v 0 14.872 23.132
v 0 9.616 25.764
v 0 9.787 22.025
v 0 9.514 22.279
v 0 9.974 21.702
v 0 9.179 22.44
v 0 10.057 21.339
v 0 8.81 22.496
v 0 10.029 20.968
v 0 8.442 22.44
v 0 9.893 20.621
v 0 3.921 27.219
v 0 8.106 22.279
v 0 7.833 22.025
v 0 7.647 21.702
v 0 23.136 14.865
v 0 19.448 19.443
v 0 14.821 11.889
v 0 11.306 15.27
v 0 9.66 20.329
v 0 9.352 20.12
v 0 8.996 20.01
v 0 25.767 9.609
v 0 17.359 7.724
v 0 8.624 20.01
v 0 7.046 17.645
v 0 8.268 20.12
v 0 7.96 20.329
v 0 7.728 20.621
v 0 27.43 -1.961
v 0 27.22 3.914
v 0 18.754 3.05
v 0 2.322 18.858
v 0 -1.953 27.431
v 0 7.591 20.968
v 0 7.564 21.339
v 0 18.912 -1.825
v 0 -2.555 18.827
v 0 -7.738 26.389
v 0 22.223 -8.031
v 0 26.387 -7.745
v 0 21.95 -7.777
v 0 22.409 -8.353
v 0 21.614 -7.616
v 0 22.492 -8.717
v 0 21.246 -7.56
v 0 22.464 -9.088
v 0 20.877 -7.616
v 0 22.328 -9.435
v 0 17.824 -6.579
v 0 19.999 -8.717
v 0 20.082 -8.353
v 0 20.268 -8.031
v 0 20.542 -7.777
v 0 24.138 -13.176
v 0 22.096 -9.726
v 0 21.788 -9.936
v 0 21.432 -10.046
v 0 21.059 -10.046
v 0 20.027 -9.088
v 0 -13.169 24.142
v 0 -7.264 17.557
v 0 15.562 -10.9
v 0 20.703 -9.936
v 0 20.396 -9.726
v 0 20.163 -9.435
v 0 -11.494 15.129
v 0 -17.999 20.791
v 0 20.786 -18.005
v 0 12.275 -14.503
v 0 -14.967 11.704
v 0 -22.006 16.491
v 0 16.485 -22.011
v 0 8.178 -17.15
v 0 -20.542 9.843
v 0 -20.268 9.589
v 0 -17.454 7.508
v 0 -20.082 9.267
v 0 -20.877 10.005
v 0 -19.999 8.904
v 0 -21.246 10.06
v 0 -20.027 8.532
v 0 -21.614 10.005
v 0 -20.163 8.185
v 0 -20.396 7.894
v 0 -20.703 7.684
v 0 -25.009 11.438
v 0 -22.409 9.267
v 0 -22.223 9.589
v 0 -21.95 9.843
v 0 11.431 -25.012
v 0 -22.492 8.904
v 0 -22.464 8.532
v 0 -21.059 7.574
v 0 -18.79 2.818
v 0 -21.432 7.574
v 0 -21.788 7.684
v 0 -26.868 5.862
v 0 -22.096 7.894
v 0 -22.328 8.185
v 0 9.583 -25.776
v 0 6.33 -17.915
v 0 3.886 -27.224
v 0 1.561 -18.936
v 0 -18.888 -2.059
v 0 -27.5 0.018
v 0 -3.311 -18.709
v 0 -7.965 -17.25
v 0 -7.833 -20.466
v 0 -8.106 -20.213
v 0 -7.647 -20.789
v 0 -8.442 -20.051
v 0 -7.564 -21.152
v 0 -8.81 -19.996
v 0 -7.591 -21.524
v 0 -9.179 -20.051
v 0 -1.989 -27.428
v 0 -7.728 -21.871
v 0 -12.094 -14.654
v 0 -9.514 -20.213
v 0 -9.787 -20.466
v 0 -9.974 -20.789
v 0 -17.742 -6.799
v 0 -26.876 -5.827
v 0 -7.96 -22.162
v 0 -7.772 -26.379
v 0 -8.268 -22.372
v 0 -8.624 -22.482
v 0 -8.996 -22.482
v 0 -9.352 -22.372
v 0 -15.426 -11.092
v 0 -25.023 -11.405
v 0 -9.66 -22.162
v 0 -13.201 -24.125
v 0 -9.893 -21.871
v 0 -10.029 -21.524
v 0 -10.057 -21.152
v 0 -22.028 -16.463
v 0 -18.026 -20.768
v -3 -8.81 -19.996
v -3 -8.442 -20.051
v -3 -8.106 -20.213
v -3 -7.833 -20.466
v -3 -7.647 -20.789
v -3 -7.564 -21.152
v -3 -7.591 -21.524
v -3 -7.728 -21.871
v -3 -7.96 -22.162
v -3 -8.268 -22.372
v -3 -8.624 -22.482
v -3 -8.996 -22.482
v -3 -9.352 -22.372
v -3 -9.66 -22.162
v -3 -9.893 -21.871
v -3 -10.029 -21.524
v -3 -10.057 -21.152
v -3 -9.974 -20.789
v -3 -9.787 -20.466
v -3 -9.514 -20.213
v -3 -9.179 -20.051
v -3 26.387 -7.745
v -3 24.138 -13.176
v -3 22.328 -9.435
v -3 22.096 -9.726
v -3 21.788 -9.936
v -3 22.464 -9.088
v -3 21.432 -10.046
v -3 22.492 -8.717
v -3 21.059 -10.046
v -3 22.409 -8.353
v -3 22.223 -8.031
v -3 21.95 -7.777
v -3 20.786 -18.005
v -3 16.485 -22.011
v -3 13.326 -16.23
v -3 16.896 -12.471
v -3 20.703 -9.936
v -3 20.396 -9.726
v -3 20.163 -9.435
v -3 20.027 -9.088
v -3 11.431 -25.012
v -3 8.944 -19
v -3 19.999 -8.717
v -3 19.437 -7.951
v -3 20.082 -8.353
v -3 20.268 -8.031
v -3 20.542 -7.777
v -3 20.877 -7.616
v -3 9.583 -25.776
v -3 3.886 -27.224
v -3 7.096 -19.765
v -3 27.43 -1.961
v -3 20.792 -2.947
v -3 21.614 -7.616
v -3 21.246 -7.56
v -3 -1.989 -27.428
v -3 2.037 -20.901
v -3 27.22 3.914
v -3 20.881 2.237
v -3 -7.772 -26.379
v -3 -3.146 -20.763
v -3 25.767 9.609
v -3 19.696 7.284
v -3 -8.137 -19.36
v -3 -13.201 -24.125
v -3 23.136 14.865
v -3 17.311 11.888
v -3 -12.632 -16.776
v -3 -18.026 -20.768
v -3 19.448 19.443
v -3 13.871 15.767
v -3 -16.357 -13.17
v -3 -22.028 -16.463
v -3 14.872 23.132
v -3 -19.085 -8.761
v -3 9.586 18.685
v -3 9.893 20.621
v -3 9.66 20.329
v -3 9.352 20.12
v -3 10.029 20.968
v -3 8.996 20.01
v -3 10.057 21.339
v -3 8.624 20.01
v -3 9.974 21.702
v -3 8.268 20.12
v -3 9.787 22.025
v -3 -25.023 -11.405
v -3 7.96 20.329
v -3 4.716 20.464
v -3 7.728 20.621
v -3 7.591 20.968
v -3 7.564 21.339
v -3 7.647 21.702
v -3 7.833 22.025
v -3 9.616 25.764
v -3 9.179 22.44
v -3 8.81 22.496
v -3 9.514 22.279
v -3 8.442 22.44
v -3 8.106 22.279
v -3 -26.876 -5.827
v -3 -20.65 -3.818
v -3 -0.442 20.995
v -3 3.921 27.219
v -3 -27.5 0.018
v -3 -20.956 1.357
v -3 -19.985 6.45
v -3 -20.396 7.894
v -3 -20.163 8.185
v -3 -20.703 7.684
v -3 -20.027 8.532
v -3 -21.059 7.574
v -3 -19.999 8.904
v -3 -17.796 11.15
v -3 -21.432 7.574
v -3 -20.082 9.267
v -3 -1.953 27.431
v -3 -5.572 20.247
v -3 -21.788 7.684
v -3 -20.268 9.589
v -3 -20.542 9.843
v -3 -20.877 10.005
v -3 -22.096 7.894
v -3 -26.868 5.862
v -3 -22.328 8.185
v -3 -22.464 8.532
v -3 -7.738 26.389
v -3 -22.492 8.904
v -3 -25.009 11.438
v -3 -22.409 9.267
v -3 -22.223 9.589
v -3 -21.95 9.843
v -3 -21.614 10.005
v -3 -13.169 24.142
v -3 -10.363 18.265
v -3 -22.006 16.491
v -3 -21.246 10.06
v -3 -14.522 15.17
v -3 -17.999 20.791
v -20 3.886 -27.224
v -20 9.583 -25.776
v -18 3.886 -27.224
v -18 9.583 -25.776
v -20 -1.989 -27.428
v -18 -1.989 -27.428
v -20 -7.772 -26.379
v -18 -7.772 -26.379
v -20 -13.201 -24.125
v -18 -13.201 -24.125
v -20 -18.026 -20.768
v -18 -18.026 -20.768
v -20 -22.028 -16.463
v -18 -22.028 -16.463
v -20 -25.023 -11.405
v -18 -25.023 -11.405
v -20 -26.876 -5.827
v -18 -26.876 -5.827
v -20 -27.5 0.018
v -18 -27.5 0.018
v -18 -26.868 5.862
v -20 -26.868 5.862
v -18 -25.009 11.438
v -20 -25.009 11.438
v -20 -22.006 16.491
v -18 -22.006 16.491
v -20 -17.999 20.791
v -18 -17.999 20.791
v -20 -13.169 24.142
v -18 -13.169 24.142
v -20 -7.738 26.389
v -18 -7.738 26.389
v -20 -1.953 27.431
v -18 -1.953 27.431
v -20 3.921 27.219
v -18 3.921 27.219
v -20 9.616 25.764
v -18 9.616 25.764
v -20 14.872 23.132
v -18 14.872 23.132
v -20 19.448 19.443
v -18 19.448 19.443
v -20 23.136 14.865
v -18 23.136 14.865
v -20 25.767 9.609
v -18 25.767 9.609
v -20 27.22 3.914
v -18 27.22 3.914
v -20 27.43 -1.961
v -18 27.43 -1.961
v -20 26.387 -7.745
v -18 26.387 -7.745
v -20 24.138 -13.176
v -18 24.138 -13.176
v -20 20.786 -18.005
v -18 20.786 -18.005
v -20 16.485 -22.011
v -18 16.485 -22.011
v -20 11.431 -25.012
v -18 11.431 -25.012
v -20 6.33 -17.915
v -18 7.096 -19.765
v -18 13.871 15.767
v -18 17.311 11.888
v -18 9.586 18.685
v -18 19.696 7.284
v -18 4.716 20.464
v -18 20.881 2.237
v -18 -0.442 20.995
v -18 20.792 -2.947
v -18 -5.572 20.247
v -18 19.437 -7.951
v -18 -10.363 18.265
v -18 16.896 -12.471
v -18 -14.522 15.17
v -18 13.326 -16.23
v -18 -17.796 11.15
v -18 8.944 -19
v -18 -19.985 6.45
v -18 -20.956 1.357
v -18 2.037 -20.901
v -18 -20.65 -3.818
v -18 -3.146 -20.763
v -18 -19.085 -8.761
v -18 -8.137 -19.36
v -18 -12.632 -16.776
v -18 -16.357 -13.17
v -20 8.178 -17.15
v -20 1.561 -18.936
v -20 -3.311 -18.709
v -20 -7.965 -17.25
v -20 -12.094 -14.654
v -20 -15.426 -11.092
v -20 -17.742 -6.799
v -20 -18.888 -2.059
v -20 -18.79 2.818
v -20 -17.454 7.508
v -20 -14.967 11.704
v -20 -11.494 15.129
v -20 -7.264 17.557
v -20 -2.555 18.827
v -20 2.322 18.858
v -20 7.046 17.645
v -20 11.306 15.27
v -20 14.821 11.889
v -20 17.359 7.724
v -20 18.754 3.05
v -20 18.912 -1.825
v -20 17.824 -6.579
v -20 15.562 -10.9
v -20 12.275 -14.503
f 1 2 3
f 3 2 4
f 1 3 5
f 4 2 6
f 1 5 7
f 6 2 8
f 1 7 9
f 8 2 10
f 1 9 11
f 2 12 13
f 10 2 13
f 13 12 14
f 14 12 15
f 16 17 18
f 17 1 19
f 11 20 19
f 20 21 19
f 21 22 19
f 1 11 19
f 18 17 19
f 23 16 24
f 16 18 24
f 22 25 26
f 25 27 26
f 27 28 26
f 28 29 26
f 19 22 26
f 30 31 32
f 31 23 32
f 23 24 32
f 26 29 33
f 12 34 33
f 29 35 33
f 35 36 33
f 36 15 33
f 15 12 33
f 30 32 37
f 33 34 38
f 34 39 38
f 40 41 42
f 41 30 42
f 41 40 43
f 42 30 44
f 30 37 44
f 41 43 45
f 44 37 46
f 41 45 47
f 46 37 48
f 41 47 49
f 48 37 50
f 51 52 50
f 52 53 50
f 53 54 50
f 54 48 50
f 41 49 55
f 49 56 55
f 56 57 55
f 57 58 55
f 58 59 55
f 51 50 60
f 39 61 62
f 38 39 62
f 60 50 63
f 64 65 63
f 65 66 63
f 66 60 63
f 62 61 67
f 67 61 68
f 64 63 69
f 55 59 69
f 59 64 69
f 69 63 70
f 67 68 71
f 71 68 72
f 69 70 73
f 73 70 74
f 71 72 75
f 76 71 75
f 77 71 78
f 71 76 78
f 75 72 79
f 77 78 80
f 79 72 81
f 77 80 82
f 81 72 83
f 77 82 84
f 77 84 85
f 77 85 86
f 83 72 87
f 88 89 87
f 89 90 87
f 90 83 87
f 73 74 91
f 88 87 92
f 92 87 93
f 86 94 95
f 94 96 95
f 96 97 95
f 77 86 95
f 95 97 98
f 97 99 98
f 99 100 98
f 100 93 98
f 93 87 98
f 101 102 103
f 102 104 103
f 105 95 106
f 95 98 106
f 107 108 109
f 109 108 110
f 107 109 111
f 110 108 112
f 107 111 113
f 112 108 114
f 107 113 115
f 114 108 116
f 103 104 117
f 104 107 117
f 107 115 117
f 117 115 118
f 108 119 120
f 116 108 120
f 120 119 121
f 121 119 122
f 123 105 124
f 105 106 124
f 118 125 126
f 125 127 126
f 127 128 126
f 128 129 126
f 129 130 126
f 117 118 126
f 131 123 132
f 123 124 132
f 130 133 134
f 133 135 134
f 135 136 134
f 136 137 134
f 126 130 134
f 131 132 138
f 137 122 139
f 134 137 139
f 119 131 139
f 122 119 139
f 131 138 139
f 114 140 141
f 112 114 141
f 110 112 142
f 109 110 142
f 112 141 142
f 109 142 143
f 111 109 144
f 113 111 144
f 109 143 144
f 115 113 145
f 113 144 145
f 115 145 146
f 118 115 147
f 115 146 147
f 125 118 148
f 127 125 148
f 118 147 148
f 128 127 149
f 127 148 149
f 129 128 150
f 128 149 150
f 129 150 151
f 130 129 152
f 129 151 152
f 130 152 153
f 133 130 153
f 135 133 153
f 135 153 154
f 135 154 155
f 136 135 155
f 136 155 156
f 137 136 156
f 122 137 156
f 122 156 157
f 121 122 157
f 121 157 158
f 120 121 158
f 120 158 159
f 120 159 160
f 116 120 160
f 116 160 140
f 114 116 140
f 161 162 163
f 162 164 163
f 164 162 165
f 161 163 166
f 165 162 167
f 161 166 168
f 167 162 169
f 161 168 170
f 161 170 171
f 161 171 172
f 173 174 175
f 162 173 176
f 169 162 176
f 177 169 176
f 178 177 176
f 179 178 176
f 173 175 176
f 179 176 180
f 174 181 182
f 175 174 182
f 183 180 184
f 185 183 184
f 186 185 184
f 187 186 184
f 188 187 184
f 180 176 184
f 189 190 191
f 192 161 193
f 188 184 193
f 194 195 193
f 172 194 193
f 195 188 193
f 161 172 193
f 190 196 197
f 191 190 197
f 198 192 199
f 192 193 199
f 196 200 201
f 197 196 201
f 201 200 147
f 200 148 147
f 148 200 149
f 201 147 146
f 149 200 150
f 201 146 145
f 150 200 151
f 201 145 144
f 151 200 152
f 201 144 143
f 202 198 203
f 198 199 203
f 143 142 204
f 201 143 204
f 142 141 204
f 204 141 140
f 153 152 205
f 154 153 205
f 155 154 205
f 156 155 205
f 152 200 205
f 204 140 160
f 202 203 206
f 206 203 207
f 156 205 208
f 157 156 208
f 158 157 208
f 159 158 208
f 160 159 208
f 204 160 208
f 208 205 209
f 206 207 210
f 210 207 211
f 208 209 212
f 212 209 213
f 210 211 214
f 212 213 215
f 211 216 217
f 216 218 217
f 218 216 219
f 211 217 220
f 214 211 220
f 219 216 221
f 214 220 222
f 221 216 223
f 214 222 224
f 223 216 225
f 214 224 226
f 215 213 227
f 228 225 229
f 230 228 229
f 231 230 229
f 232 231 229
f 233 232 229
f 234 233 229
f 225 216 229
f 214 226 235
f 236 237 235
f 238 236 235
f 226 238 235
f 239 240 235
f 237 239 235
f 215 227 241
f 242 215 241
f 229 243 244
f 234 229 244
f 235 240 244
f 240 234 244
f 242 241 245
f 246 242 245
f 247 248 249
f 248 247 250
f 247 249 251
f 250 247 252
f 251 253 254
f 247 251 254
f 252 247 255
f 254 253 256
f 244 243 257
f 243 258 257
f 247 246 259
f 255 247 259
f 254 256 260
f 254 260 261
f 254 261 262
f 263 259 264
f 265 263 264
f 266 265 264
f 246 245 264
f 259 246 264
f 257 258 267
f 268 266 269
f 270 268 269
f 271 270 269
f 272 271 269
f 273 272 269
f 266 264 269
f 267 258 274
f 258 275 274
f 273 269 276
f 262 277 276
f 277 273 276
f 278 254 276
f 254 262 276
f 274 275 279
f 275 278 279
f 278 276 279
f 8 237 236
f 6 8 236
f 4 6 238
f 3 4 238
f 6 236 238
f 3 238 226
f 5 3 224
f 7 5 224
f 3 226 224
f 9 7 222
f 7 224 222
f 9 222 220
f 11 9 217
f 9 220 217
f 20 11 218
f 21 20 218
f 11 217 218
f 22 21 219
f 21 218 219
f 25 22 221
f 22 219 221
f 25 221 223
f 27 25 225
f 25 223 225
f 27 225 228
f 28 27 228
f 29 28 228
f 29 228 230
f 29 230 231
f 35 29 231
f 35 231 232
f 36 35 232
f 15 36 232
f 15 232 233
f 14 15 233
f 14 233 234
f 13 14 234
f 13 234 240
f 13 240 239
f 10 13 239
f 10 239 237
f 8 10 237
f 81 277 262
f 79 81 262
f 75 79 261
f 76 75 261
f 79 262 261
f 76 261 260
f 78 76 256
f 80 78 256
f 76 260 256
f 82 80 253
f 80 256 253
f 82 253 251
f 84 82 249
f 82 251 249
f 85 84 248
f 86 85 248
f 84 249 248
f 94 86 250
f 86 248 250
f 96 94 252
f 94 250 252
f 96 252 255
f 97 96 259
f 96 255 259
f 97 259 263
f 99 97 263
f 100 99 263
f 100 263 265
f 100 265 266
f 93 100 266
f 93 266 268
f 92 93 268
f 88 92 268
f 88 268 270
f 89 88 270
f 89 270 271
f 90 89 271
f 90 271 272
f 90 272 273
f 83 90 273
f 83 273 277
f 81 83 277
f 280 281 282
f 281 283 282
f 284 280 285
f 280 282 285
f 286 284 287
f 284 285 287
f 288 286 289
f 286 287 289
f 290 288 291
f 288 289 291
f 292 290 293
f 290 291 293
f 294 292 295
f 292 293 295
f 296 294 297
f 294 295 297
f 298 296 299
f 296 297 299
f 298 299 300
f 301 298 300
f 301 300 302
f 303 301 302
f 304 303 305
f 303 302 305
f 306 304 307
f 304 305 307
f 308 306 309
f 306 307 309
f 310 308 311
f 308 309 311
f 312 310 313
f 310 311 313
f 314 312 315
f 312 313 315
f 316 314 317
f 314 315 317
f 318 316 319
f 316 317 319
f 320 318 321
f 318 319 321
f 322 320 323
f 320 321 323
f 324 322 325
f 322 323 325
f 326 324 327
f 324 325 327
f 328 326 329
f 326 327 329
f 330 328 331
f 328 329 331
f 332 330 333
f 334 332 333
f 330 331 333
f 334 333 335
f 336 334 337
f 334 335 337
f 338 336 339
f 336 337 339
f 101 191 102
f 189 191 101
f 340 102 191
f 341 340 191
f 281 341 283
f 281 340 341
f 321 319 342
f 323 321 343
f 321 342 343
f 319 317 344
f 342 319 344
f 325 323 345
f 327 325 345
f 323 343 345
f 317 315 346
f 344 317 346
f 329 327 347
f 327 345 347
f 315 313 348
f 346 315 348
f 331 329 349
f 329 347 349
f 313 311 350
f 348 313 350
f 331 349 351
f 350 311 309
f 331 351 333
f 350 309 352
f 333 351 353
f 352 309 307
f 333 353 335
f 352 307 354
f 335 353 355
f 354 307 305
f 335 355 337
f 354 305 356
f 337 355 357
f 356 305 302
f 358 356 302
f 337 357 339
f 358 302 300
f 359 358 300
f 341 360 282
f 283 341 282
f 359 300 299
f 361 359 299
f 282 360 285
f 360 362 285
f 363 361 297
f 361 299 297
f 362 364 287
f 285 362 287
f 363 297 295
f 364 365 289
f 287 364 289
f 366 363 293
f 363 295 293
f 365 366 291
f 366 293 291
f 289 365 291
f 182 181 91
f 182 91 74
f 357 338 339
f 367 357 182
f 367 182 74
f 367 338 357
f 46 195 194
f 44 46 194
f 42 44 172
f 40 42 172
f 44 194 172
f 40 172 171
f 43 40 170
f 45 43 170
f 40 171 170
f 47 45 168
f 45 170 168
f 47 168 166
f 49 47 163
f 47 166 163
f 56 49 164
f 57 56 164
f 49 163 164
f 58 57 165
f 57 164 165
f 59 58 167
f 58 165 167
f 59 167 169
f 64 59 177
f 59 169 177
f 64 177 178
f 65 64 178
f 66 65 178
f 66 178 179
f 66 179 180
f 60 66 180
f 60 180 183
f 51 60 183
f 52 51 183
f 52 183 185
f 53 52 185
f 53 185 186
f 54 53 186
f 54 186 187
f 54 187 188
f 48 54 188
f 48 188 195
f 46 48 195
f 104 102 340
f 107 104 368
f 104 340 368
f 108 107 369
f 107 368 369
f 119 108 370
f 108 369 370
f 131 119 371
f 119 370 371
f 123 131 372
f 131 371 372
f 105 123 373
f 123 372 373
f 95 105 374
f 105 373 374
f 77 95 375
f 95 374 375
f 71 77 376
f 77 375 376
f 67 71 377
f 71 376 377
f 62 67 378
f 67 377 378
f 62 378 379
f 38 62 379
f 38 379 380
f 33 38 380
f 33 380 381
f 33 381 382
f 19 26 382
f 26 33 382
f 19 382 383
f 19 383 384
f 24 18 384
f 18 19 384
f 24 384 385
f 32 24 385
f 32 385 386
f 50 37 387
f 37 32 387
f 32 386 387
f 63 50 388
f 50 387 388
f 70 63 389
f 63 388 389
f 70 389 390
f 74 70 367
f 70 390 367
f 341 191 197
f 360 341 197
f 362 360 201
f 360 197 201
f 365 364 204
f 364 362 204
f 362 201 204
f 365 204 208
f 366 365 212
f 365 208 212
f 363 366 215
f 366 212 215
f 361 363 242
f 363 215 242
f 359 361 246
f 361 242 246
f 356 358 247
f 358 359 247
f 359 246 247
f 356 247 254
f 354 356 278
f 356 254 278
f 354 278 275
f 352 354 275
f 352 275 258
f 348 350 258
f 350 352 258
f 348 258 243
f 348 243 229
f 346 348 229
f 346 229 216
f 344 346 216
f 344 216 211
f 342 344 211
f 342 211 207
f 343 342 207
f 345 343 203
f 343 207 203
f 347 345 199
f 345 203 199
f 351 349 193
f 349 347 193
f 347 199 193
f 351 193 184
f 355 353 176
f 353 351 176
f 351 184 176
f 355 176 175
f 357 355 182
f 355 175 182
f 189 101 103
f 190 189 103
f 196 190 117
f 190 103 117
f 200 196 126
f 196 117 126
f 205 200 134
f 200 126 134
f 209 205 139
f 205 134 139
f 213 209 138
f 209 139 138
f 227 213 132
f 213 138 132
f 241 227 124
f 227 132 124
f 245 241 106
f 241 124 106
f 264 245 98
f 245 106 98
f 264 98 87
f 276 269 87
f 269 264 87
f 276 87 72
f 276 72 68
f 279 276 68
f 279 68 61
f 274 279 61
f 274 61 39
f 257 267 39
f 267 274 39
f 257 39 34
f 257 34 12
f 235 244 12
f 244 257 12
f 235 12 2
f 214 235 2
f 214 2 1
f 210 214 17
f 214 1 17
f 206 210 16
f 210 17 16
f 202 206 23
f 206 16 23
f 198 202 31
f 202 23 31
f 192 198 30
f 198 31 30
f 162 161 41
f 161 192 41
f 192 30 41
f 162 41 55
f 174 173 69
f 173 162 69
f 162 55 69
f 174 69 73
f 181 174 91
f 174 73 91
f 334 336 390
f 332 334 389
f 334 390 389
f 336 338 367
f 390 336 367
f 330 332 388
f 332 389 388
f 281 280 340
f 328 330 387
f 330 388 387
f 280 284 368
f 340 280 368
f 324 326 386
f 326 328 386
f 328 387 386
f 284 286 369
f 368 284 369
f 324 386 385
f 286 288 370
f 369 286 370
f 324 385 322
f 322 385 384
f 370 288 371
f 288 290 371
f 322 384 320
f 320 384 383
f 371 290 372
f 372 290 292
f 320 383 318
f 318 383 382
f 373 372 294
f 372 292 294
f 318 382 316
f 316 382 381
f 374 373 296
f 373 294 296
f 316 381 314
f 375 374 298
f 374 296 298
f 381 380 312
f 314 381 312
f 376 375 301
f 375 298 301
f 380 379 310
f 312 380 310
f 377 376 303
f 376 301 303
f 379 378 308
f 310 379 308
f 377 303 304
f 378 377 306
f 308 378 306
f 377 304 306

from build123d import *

# Parameters (mm, degrees)
M3X0_5_TAPPED_HOLE1_D     = 2.5
M3X0_5_TAPPED_HOLE1_DEPTH = 7.5
M3X0_5_TAPPED_HOLE1_TIP   = 0.751075774
CUT_EXTRUDE1_DEPTH        = 44.732139211


with BuildPart() as part:
    # Sketch1 → Revolve1 (revolve)
    with BuildSketch(Plane.XY, mode=Mode.PRIVATE) as revolve1_sk:
        Polygon((0, 19), (-20, 19), (-20, 27.5), (-18, 27.5), (-18, 21), (-3, 21), (-3, 27.5), (0, 27.5), align=None)
    revolve(revolve1_sk.sketch.rotate(Axis((0, 0, 0), (-1, 0, 0)), 90), axis=Axis((0, 0, 0), (-1, 0, 0)))

    # M3x0.5 Tapped Hole1
    with Locations(Plane(origin=(0, 0, 0), x_dir=(0, 0, -1), z_dir=(1, 0, 0))):
        with Locations((-8.810127185, -21.245744491), (21.245744491, -8.810127185), (8.810127185, 21.245744491), (-21.245744491, 8.810127185)):
            Hole(M3X0_5_TAPPED_HOLE1_D / 2, depth=M3X0_5_TAPPED_HOLE1_DEPTH)
            with Locations((0, 0, -(M3X0_5_TAPPED_HOLE1_DEPTH + M3X0_5_TAPPED_HOLE1_TIP / 2))):  # 118° drill point
                Cone(0, M3X0_5_TAPPED_HOLE1_D / 2, M3X0_5_TAPPED_HOLE1_TIP, mode=Mode.SUBTRACT)

    # Sketch4 → Cut-Extrude1 (cut, through all)
    with BuildSketch(Plane.ZY.offset(20)):
        Polygon((-25.793167519, 9.589708511), (-25.028531926, 11.437770309), (-17.149935818, 8.178001065), (-17.914571412, 6.329939267), align=None)
    extrude(amount=-CUT_EXTRUDE1_DEPTH, mode=Mode.SUBTRACT)


solid = part.part
